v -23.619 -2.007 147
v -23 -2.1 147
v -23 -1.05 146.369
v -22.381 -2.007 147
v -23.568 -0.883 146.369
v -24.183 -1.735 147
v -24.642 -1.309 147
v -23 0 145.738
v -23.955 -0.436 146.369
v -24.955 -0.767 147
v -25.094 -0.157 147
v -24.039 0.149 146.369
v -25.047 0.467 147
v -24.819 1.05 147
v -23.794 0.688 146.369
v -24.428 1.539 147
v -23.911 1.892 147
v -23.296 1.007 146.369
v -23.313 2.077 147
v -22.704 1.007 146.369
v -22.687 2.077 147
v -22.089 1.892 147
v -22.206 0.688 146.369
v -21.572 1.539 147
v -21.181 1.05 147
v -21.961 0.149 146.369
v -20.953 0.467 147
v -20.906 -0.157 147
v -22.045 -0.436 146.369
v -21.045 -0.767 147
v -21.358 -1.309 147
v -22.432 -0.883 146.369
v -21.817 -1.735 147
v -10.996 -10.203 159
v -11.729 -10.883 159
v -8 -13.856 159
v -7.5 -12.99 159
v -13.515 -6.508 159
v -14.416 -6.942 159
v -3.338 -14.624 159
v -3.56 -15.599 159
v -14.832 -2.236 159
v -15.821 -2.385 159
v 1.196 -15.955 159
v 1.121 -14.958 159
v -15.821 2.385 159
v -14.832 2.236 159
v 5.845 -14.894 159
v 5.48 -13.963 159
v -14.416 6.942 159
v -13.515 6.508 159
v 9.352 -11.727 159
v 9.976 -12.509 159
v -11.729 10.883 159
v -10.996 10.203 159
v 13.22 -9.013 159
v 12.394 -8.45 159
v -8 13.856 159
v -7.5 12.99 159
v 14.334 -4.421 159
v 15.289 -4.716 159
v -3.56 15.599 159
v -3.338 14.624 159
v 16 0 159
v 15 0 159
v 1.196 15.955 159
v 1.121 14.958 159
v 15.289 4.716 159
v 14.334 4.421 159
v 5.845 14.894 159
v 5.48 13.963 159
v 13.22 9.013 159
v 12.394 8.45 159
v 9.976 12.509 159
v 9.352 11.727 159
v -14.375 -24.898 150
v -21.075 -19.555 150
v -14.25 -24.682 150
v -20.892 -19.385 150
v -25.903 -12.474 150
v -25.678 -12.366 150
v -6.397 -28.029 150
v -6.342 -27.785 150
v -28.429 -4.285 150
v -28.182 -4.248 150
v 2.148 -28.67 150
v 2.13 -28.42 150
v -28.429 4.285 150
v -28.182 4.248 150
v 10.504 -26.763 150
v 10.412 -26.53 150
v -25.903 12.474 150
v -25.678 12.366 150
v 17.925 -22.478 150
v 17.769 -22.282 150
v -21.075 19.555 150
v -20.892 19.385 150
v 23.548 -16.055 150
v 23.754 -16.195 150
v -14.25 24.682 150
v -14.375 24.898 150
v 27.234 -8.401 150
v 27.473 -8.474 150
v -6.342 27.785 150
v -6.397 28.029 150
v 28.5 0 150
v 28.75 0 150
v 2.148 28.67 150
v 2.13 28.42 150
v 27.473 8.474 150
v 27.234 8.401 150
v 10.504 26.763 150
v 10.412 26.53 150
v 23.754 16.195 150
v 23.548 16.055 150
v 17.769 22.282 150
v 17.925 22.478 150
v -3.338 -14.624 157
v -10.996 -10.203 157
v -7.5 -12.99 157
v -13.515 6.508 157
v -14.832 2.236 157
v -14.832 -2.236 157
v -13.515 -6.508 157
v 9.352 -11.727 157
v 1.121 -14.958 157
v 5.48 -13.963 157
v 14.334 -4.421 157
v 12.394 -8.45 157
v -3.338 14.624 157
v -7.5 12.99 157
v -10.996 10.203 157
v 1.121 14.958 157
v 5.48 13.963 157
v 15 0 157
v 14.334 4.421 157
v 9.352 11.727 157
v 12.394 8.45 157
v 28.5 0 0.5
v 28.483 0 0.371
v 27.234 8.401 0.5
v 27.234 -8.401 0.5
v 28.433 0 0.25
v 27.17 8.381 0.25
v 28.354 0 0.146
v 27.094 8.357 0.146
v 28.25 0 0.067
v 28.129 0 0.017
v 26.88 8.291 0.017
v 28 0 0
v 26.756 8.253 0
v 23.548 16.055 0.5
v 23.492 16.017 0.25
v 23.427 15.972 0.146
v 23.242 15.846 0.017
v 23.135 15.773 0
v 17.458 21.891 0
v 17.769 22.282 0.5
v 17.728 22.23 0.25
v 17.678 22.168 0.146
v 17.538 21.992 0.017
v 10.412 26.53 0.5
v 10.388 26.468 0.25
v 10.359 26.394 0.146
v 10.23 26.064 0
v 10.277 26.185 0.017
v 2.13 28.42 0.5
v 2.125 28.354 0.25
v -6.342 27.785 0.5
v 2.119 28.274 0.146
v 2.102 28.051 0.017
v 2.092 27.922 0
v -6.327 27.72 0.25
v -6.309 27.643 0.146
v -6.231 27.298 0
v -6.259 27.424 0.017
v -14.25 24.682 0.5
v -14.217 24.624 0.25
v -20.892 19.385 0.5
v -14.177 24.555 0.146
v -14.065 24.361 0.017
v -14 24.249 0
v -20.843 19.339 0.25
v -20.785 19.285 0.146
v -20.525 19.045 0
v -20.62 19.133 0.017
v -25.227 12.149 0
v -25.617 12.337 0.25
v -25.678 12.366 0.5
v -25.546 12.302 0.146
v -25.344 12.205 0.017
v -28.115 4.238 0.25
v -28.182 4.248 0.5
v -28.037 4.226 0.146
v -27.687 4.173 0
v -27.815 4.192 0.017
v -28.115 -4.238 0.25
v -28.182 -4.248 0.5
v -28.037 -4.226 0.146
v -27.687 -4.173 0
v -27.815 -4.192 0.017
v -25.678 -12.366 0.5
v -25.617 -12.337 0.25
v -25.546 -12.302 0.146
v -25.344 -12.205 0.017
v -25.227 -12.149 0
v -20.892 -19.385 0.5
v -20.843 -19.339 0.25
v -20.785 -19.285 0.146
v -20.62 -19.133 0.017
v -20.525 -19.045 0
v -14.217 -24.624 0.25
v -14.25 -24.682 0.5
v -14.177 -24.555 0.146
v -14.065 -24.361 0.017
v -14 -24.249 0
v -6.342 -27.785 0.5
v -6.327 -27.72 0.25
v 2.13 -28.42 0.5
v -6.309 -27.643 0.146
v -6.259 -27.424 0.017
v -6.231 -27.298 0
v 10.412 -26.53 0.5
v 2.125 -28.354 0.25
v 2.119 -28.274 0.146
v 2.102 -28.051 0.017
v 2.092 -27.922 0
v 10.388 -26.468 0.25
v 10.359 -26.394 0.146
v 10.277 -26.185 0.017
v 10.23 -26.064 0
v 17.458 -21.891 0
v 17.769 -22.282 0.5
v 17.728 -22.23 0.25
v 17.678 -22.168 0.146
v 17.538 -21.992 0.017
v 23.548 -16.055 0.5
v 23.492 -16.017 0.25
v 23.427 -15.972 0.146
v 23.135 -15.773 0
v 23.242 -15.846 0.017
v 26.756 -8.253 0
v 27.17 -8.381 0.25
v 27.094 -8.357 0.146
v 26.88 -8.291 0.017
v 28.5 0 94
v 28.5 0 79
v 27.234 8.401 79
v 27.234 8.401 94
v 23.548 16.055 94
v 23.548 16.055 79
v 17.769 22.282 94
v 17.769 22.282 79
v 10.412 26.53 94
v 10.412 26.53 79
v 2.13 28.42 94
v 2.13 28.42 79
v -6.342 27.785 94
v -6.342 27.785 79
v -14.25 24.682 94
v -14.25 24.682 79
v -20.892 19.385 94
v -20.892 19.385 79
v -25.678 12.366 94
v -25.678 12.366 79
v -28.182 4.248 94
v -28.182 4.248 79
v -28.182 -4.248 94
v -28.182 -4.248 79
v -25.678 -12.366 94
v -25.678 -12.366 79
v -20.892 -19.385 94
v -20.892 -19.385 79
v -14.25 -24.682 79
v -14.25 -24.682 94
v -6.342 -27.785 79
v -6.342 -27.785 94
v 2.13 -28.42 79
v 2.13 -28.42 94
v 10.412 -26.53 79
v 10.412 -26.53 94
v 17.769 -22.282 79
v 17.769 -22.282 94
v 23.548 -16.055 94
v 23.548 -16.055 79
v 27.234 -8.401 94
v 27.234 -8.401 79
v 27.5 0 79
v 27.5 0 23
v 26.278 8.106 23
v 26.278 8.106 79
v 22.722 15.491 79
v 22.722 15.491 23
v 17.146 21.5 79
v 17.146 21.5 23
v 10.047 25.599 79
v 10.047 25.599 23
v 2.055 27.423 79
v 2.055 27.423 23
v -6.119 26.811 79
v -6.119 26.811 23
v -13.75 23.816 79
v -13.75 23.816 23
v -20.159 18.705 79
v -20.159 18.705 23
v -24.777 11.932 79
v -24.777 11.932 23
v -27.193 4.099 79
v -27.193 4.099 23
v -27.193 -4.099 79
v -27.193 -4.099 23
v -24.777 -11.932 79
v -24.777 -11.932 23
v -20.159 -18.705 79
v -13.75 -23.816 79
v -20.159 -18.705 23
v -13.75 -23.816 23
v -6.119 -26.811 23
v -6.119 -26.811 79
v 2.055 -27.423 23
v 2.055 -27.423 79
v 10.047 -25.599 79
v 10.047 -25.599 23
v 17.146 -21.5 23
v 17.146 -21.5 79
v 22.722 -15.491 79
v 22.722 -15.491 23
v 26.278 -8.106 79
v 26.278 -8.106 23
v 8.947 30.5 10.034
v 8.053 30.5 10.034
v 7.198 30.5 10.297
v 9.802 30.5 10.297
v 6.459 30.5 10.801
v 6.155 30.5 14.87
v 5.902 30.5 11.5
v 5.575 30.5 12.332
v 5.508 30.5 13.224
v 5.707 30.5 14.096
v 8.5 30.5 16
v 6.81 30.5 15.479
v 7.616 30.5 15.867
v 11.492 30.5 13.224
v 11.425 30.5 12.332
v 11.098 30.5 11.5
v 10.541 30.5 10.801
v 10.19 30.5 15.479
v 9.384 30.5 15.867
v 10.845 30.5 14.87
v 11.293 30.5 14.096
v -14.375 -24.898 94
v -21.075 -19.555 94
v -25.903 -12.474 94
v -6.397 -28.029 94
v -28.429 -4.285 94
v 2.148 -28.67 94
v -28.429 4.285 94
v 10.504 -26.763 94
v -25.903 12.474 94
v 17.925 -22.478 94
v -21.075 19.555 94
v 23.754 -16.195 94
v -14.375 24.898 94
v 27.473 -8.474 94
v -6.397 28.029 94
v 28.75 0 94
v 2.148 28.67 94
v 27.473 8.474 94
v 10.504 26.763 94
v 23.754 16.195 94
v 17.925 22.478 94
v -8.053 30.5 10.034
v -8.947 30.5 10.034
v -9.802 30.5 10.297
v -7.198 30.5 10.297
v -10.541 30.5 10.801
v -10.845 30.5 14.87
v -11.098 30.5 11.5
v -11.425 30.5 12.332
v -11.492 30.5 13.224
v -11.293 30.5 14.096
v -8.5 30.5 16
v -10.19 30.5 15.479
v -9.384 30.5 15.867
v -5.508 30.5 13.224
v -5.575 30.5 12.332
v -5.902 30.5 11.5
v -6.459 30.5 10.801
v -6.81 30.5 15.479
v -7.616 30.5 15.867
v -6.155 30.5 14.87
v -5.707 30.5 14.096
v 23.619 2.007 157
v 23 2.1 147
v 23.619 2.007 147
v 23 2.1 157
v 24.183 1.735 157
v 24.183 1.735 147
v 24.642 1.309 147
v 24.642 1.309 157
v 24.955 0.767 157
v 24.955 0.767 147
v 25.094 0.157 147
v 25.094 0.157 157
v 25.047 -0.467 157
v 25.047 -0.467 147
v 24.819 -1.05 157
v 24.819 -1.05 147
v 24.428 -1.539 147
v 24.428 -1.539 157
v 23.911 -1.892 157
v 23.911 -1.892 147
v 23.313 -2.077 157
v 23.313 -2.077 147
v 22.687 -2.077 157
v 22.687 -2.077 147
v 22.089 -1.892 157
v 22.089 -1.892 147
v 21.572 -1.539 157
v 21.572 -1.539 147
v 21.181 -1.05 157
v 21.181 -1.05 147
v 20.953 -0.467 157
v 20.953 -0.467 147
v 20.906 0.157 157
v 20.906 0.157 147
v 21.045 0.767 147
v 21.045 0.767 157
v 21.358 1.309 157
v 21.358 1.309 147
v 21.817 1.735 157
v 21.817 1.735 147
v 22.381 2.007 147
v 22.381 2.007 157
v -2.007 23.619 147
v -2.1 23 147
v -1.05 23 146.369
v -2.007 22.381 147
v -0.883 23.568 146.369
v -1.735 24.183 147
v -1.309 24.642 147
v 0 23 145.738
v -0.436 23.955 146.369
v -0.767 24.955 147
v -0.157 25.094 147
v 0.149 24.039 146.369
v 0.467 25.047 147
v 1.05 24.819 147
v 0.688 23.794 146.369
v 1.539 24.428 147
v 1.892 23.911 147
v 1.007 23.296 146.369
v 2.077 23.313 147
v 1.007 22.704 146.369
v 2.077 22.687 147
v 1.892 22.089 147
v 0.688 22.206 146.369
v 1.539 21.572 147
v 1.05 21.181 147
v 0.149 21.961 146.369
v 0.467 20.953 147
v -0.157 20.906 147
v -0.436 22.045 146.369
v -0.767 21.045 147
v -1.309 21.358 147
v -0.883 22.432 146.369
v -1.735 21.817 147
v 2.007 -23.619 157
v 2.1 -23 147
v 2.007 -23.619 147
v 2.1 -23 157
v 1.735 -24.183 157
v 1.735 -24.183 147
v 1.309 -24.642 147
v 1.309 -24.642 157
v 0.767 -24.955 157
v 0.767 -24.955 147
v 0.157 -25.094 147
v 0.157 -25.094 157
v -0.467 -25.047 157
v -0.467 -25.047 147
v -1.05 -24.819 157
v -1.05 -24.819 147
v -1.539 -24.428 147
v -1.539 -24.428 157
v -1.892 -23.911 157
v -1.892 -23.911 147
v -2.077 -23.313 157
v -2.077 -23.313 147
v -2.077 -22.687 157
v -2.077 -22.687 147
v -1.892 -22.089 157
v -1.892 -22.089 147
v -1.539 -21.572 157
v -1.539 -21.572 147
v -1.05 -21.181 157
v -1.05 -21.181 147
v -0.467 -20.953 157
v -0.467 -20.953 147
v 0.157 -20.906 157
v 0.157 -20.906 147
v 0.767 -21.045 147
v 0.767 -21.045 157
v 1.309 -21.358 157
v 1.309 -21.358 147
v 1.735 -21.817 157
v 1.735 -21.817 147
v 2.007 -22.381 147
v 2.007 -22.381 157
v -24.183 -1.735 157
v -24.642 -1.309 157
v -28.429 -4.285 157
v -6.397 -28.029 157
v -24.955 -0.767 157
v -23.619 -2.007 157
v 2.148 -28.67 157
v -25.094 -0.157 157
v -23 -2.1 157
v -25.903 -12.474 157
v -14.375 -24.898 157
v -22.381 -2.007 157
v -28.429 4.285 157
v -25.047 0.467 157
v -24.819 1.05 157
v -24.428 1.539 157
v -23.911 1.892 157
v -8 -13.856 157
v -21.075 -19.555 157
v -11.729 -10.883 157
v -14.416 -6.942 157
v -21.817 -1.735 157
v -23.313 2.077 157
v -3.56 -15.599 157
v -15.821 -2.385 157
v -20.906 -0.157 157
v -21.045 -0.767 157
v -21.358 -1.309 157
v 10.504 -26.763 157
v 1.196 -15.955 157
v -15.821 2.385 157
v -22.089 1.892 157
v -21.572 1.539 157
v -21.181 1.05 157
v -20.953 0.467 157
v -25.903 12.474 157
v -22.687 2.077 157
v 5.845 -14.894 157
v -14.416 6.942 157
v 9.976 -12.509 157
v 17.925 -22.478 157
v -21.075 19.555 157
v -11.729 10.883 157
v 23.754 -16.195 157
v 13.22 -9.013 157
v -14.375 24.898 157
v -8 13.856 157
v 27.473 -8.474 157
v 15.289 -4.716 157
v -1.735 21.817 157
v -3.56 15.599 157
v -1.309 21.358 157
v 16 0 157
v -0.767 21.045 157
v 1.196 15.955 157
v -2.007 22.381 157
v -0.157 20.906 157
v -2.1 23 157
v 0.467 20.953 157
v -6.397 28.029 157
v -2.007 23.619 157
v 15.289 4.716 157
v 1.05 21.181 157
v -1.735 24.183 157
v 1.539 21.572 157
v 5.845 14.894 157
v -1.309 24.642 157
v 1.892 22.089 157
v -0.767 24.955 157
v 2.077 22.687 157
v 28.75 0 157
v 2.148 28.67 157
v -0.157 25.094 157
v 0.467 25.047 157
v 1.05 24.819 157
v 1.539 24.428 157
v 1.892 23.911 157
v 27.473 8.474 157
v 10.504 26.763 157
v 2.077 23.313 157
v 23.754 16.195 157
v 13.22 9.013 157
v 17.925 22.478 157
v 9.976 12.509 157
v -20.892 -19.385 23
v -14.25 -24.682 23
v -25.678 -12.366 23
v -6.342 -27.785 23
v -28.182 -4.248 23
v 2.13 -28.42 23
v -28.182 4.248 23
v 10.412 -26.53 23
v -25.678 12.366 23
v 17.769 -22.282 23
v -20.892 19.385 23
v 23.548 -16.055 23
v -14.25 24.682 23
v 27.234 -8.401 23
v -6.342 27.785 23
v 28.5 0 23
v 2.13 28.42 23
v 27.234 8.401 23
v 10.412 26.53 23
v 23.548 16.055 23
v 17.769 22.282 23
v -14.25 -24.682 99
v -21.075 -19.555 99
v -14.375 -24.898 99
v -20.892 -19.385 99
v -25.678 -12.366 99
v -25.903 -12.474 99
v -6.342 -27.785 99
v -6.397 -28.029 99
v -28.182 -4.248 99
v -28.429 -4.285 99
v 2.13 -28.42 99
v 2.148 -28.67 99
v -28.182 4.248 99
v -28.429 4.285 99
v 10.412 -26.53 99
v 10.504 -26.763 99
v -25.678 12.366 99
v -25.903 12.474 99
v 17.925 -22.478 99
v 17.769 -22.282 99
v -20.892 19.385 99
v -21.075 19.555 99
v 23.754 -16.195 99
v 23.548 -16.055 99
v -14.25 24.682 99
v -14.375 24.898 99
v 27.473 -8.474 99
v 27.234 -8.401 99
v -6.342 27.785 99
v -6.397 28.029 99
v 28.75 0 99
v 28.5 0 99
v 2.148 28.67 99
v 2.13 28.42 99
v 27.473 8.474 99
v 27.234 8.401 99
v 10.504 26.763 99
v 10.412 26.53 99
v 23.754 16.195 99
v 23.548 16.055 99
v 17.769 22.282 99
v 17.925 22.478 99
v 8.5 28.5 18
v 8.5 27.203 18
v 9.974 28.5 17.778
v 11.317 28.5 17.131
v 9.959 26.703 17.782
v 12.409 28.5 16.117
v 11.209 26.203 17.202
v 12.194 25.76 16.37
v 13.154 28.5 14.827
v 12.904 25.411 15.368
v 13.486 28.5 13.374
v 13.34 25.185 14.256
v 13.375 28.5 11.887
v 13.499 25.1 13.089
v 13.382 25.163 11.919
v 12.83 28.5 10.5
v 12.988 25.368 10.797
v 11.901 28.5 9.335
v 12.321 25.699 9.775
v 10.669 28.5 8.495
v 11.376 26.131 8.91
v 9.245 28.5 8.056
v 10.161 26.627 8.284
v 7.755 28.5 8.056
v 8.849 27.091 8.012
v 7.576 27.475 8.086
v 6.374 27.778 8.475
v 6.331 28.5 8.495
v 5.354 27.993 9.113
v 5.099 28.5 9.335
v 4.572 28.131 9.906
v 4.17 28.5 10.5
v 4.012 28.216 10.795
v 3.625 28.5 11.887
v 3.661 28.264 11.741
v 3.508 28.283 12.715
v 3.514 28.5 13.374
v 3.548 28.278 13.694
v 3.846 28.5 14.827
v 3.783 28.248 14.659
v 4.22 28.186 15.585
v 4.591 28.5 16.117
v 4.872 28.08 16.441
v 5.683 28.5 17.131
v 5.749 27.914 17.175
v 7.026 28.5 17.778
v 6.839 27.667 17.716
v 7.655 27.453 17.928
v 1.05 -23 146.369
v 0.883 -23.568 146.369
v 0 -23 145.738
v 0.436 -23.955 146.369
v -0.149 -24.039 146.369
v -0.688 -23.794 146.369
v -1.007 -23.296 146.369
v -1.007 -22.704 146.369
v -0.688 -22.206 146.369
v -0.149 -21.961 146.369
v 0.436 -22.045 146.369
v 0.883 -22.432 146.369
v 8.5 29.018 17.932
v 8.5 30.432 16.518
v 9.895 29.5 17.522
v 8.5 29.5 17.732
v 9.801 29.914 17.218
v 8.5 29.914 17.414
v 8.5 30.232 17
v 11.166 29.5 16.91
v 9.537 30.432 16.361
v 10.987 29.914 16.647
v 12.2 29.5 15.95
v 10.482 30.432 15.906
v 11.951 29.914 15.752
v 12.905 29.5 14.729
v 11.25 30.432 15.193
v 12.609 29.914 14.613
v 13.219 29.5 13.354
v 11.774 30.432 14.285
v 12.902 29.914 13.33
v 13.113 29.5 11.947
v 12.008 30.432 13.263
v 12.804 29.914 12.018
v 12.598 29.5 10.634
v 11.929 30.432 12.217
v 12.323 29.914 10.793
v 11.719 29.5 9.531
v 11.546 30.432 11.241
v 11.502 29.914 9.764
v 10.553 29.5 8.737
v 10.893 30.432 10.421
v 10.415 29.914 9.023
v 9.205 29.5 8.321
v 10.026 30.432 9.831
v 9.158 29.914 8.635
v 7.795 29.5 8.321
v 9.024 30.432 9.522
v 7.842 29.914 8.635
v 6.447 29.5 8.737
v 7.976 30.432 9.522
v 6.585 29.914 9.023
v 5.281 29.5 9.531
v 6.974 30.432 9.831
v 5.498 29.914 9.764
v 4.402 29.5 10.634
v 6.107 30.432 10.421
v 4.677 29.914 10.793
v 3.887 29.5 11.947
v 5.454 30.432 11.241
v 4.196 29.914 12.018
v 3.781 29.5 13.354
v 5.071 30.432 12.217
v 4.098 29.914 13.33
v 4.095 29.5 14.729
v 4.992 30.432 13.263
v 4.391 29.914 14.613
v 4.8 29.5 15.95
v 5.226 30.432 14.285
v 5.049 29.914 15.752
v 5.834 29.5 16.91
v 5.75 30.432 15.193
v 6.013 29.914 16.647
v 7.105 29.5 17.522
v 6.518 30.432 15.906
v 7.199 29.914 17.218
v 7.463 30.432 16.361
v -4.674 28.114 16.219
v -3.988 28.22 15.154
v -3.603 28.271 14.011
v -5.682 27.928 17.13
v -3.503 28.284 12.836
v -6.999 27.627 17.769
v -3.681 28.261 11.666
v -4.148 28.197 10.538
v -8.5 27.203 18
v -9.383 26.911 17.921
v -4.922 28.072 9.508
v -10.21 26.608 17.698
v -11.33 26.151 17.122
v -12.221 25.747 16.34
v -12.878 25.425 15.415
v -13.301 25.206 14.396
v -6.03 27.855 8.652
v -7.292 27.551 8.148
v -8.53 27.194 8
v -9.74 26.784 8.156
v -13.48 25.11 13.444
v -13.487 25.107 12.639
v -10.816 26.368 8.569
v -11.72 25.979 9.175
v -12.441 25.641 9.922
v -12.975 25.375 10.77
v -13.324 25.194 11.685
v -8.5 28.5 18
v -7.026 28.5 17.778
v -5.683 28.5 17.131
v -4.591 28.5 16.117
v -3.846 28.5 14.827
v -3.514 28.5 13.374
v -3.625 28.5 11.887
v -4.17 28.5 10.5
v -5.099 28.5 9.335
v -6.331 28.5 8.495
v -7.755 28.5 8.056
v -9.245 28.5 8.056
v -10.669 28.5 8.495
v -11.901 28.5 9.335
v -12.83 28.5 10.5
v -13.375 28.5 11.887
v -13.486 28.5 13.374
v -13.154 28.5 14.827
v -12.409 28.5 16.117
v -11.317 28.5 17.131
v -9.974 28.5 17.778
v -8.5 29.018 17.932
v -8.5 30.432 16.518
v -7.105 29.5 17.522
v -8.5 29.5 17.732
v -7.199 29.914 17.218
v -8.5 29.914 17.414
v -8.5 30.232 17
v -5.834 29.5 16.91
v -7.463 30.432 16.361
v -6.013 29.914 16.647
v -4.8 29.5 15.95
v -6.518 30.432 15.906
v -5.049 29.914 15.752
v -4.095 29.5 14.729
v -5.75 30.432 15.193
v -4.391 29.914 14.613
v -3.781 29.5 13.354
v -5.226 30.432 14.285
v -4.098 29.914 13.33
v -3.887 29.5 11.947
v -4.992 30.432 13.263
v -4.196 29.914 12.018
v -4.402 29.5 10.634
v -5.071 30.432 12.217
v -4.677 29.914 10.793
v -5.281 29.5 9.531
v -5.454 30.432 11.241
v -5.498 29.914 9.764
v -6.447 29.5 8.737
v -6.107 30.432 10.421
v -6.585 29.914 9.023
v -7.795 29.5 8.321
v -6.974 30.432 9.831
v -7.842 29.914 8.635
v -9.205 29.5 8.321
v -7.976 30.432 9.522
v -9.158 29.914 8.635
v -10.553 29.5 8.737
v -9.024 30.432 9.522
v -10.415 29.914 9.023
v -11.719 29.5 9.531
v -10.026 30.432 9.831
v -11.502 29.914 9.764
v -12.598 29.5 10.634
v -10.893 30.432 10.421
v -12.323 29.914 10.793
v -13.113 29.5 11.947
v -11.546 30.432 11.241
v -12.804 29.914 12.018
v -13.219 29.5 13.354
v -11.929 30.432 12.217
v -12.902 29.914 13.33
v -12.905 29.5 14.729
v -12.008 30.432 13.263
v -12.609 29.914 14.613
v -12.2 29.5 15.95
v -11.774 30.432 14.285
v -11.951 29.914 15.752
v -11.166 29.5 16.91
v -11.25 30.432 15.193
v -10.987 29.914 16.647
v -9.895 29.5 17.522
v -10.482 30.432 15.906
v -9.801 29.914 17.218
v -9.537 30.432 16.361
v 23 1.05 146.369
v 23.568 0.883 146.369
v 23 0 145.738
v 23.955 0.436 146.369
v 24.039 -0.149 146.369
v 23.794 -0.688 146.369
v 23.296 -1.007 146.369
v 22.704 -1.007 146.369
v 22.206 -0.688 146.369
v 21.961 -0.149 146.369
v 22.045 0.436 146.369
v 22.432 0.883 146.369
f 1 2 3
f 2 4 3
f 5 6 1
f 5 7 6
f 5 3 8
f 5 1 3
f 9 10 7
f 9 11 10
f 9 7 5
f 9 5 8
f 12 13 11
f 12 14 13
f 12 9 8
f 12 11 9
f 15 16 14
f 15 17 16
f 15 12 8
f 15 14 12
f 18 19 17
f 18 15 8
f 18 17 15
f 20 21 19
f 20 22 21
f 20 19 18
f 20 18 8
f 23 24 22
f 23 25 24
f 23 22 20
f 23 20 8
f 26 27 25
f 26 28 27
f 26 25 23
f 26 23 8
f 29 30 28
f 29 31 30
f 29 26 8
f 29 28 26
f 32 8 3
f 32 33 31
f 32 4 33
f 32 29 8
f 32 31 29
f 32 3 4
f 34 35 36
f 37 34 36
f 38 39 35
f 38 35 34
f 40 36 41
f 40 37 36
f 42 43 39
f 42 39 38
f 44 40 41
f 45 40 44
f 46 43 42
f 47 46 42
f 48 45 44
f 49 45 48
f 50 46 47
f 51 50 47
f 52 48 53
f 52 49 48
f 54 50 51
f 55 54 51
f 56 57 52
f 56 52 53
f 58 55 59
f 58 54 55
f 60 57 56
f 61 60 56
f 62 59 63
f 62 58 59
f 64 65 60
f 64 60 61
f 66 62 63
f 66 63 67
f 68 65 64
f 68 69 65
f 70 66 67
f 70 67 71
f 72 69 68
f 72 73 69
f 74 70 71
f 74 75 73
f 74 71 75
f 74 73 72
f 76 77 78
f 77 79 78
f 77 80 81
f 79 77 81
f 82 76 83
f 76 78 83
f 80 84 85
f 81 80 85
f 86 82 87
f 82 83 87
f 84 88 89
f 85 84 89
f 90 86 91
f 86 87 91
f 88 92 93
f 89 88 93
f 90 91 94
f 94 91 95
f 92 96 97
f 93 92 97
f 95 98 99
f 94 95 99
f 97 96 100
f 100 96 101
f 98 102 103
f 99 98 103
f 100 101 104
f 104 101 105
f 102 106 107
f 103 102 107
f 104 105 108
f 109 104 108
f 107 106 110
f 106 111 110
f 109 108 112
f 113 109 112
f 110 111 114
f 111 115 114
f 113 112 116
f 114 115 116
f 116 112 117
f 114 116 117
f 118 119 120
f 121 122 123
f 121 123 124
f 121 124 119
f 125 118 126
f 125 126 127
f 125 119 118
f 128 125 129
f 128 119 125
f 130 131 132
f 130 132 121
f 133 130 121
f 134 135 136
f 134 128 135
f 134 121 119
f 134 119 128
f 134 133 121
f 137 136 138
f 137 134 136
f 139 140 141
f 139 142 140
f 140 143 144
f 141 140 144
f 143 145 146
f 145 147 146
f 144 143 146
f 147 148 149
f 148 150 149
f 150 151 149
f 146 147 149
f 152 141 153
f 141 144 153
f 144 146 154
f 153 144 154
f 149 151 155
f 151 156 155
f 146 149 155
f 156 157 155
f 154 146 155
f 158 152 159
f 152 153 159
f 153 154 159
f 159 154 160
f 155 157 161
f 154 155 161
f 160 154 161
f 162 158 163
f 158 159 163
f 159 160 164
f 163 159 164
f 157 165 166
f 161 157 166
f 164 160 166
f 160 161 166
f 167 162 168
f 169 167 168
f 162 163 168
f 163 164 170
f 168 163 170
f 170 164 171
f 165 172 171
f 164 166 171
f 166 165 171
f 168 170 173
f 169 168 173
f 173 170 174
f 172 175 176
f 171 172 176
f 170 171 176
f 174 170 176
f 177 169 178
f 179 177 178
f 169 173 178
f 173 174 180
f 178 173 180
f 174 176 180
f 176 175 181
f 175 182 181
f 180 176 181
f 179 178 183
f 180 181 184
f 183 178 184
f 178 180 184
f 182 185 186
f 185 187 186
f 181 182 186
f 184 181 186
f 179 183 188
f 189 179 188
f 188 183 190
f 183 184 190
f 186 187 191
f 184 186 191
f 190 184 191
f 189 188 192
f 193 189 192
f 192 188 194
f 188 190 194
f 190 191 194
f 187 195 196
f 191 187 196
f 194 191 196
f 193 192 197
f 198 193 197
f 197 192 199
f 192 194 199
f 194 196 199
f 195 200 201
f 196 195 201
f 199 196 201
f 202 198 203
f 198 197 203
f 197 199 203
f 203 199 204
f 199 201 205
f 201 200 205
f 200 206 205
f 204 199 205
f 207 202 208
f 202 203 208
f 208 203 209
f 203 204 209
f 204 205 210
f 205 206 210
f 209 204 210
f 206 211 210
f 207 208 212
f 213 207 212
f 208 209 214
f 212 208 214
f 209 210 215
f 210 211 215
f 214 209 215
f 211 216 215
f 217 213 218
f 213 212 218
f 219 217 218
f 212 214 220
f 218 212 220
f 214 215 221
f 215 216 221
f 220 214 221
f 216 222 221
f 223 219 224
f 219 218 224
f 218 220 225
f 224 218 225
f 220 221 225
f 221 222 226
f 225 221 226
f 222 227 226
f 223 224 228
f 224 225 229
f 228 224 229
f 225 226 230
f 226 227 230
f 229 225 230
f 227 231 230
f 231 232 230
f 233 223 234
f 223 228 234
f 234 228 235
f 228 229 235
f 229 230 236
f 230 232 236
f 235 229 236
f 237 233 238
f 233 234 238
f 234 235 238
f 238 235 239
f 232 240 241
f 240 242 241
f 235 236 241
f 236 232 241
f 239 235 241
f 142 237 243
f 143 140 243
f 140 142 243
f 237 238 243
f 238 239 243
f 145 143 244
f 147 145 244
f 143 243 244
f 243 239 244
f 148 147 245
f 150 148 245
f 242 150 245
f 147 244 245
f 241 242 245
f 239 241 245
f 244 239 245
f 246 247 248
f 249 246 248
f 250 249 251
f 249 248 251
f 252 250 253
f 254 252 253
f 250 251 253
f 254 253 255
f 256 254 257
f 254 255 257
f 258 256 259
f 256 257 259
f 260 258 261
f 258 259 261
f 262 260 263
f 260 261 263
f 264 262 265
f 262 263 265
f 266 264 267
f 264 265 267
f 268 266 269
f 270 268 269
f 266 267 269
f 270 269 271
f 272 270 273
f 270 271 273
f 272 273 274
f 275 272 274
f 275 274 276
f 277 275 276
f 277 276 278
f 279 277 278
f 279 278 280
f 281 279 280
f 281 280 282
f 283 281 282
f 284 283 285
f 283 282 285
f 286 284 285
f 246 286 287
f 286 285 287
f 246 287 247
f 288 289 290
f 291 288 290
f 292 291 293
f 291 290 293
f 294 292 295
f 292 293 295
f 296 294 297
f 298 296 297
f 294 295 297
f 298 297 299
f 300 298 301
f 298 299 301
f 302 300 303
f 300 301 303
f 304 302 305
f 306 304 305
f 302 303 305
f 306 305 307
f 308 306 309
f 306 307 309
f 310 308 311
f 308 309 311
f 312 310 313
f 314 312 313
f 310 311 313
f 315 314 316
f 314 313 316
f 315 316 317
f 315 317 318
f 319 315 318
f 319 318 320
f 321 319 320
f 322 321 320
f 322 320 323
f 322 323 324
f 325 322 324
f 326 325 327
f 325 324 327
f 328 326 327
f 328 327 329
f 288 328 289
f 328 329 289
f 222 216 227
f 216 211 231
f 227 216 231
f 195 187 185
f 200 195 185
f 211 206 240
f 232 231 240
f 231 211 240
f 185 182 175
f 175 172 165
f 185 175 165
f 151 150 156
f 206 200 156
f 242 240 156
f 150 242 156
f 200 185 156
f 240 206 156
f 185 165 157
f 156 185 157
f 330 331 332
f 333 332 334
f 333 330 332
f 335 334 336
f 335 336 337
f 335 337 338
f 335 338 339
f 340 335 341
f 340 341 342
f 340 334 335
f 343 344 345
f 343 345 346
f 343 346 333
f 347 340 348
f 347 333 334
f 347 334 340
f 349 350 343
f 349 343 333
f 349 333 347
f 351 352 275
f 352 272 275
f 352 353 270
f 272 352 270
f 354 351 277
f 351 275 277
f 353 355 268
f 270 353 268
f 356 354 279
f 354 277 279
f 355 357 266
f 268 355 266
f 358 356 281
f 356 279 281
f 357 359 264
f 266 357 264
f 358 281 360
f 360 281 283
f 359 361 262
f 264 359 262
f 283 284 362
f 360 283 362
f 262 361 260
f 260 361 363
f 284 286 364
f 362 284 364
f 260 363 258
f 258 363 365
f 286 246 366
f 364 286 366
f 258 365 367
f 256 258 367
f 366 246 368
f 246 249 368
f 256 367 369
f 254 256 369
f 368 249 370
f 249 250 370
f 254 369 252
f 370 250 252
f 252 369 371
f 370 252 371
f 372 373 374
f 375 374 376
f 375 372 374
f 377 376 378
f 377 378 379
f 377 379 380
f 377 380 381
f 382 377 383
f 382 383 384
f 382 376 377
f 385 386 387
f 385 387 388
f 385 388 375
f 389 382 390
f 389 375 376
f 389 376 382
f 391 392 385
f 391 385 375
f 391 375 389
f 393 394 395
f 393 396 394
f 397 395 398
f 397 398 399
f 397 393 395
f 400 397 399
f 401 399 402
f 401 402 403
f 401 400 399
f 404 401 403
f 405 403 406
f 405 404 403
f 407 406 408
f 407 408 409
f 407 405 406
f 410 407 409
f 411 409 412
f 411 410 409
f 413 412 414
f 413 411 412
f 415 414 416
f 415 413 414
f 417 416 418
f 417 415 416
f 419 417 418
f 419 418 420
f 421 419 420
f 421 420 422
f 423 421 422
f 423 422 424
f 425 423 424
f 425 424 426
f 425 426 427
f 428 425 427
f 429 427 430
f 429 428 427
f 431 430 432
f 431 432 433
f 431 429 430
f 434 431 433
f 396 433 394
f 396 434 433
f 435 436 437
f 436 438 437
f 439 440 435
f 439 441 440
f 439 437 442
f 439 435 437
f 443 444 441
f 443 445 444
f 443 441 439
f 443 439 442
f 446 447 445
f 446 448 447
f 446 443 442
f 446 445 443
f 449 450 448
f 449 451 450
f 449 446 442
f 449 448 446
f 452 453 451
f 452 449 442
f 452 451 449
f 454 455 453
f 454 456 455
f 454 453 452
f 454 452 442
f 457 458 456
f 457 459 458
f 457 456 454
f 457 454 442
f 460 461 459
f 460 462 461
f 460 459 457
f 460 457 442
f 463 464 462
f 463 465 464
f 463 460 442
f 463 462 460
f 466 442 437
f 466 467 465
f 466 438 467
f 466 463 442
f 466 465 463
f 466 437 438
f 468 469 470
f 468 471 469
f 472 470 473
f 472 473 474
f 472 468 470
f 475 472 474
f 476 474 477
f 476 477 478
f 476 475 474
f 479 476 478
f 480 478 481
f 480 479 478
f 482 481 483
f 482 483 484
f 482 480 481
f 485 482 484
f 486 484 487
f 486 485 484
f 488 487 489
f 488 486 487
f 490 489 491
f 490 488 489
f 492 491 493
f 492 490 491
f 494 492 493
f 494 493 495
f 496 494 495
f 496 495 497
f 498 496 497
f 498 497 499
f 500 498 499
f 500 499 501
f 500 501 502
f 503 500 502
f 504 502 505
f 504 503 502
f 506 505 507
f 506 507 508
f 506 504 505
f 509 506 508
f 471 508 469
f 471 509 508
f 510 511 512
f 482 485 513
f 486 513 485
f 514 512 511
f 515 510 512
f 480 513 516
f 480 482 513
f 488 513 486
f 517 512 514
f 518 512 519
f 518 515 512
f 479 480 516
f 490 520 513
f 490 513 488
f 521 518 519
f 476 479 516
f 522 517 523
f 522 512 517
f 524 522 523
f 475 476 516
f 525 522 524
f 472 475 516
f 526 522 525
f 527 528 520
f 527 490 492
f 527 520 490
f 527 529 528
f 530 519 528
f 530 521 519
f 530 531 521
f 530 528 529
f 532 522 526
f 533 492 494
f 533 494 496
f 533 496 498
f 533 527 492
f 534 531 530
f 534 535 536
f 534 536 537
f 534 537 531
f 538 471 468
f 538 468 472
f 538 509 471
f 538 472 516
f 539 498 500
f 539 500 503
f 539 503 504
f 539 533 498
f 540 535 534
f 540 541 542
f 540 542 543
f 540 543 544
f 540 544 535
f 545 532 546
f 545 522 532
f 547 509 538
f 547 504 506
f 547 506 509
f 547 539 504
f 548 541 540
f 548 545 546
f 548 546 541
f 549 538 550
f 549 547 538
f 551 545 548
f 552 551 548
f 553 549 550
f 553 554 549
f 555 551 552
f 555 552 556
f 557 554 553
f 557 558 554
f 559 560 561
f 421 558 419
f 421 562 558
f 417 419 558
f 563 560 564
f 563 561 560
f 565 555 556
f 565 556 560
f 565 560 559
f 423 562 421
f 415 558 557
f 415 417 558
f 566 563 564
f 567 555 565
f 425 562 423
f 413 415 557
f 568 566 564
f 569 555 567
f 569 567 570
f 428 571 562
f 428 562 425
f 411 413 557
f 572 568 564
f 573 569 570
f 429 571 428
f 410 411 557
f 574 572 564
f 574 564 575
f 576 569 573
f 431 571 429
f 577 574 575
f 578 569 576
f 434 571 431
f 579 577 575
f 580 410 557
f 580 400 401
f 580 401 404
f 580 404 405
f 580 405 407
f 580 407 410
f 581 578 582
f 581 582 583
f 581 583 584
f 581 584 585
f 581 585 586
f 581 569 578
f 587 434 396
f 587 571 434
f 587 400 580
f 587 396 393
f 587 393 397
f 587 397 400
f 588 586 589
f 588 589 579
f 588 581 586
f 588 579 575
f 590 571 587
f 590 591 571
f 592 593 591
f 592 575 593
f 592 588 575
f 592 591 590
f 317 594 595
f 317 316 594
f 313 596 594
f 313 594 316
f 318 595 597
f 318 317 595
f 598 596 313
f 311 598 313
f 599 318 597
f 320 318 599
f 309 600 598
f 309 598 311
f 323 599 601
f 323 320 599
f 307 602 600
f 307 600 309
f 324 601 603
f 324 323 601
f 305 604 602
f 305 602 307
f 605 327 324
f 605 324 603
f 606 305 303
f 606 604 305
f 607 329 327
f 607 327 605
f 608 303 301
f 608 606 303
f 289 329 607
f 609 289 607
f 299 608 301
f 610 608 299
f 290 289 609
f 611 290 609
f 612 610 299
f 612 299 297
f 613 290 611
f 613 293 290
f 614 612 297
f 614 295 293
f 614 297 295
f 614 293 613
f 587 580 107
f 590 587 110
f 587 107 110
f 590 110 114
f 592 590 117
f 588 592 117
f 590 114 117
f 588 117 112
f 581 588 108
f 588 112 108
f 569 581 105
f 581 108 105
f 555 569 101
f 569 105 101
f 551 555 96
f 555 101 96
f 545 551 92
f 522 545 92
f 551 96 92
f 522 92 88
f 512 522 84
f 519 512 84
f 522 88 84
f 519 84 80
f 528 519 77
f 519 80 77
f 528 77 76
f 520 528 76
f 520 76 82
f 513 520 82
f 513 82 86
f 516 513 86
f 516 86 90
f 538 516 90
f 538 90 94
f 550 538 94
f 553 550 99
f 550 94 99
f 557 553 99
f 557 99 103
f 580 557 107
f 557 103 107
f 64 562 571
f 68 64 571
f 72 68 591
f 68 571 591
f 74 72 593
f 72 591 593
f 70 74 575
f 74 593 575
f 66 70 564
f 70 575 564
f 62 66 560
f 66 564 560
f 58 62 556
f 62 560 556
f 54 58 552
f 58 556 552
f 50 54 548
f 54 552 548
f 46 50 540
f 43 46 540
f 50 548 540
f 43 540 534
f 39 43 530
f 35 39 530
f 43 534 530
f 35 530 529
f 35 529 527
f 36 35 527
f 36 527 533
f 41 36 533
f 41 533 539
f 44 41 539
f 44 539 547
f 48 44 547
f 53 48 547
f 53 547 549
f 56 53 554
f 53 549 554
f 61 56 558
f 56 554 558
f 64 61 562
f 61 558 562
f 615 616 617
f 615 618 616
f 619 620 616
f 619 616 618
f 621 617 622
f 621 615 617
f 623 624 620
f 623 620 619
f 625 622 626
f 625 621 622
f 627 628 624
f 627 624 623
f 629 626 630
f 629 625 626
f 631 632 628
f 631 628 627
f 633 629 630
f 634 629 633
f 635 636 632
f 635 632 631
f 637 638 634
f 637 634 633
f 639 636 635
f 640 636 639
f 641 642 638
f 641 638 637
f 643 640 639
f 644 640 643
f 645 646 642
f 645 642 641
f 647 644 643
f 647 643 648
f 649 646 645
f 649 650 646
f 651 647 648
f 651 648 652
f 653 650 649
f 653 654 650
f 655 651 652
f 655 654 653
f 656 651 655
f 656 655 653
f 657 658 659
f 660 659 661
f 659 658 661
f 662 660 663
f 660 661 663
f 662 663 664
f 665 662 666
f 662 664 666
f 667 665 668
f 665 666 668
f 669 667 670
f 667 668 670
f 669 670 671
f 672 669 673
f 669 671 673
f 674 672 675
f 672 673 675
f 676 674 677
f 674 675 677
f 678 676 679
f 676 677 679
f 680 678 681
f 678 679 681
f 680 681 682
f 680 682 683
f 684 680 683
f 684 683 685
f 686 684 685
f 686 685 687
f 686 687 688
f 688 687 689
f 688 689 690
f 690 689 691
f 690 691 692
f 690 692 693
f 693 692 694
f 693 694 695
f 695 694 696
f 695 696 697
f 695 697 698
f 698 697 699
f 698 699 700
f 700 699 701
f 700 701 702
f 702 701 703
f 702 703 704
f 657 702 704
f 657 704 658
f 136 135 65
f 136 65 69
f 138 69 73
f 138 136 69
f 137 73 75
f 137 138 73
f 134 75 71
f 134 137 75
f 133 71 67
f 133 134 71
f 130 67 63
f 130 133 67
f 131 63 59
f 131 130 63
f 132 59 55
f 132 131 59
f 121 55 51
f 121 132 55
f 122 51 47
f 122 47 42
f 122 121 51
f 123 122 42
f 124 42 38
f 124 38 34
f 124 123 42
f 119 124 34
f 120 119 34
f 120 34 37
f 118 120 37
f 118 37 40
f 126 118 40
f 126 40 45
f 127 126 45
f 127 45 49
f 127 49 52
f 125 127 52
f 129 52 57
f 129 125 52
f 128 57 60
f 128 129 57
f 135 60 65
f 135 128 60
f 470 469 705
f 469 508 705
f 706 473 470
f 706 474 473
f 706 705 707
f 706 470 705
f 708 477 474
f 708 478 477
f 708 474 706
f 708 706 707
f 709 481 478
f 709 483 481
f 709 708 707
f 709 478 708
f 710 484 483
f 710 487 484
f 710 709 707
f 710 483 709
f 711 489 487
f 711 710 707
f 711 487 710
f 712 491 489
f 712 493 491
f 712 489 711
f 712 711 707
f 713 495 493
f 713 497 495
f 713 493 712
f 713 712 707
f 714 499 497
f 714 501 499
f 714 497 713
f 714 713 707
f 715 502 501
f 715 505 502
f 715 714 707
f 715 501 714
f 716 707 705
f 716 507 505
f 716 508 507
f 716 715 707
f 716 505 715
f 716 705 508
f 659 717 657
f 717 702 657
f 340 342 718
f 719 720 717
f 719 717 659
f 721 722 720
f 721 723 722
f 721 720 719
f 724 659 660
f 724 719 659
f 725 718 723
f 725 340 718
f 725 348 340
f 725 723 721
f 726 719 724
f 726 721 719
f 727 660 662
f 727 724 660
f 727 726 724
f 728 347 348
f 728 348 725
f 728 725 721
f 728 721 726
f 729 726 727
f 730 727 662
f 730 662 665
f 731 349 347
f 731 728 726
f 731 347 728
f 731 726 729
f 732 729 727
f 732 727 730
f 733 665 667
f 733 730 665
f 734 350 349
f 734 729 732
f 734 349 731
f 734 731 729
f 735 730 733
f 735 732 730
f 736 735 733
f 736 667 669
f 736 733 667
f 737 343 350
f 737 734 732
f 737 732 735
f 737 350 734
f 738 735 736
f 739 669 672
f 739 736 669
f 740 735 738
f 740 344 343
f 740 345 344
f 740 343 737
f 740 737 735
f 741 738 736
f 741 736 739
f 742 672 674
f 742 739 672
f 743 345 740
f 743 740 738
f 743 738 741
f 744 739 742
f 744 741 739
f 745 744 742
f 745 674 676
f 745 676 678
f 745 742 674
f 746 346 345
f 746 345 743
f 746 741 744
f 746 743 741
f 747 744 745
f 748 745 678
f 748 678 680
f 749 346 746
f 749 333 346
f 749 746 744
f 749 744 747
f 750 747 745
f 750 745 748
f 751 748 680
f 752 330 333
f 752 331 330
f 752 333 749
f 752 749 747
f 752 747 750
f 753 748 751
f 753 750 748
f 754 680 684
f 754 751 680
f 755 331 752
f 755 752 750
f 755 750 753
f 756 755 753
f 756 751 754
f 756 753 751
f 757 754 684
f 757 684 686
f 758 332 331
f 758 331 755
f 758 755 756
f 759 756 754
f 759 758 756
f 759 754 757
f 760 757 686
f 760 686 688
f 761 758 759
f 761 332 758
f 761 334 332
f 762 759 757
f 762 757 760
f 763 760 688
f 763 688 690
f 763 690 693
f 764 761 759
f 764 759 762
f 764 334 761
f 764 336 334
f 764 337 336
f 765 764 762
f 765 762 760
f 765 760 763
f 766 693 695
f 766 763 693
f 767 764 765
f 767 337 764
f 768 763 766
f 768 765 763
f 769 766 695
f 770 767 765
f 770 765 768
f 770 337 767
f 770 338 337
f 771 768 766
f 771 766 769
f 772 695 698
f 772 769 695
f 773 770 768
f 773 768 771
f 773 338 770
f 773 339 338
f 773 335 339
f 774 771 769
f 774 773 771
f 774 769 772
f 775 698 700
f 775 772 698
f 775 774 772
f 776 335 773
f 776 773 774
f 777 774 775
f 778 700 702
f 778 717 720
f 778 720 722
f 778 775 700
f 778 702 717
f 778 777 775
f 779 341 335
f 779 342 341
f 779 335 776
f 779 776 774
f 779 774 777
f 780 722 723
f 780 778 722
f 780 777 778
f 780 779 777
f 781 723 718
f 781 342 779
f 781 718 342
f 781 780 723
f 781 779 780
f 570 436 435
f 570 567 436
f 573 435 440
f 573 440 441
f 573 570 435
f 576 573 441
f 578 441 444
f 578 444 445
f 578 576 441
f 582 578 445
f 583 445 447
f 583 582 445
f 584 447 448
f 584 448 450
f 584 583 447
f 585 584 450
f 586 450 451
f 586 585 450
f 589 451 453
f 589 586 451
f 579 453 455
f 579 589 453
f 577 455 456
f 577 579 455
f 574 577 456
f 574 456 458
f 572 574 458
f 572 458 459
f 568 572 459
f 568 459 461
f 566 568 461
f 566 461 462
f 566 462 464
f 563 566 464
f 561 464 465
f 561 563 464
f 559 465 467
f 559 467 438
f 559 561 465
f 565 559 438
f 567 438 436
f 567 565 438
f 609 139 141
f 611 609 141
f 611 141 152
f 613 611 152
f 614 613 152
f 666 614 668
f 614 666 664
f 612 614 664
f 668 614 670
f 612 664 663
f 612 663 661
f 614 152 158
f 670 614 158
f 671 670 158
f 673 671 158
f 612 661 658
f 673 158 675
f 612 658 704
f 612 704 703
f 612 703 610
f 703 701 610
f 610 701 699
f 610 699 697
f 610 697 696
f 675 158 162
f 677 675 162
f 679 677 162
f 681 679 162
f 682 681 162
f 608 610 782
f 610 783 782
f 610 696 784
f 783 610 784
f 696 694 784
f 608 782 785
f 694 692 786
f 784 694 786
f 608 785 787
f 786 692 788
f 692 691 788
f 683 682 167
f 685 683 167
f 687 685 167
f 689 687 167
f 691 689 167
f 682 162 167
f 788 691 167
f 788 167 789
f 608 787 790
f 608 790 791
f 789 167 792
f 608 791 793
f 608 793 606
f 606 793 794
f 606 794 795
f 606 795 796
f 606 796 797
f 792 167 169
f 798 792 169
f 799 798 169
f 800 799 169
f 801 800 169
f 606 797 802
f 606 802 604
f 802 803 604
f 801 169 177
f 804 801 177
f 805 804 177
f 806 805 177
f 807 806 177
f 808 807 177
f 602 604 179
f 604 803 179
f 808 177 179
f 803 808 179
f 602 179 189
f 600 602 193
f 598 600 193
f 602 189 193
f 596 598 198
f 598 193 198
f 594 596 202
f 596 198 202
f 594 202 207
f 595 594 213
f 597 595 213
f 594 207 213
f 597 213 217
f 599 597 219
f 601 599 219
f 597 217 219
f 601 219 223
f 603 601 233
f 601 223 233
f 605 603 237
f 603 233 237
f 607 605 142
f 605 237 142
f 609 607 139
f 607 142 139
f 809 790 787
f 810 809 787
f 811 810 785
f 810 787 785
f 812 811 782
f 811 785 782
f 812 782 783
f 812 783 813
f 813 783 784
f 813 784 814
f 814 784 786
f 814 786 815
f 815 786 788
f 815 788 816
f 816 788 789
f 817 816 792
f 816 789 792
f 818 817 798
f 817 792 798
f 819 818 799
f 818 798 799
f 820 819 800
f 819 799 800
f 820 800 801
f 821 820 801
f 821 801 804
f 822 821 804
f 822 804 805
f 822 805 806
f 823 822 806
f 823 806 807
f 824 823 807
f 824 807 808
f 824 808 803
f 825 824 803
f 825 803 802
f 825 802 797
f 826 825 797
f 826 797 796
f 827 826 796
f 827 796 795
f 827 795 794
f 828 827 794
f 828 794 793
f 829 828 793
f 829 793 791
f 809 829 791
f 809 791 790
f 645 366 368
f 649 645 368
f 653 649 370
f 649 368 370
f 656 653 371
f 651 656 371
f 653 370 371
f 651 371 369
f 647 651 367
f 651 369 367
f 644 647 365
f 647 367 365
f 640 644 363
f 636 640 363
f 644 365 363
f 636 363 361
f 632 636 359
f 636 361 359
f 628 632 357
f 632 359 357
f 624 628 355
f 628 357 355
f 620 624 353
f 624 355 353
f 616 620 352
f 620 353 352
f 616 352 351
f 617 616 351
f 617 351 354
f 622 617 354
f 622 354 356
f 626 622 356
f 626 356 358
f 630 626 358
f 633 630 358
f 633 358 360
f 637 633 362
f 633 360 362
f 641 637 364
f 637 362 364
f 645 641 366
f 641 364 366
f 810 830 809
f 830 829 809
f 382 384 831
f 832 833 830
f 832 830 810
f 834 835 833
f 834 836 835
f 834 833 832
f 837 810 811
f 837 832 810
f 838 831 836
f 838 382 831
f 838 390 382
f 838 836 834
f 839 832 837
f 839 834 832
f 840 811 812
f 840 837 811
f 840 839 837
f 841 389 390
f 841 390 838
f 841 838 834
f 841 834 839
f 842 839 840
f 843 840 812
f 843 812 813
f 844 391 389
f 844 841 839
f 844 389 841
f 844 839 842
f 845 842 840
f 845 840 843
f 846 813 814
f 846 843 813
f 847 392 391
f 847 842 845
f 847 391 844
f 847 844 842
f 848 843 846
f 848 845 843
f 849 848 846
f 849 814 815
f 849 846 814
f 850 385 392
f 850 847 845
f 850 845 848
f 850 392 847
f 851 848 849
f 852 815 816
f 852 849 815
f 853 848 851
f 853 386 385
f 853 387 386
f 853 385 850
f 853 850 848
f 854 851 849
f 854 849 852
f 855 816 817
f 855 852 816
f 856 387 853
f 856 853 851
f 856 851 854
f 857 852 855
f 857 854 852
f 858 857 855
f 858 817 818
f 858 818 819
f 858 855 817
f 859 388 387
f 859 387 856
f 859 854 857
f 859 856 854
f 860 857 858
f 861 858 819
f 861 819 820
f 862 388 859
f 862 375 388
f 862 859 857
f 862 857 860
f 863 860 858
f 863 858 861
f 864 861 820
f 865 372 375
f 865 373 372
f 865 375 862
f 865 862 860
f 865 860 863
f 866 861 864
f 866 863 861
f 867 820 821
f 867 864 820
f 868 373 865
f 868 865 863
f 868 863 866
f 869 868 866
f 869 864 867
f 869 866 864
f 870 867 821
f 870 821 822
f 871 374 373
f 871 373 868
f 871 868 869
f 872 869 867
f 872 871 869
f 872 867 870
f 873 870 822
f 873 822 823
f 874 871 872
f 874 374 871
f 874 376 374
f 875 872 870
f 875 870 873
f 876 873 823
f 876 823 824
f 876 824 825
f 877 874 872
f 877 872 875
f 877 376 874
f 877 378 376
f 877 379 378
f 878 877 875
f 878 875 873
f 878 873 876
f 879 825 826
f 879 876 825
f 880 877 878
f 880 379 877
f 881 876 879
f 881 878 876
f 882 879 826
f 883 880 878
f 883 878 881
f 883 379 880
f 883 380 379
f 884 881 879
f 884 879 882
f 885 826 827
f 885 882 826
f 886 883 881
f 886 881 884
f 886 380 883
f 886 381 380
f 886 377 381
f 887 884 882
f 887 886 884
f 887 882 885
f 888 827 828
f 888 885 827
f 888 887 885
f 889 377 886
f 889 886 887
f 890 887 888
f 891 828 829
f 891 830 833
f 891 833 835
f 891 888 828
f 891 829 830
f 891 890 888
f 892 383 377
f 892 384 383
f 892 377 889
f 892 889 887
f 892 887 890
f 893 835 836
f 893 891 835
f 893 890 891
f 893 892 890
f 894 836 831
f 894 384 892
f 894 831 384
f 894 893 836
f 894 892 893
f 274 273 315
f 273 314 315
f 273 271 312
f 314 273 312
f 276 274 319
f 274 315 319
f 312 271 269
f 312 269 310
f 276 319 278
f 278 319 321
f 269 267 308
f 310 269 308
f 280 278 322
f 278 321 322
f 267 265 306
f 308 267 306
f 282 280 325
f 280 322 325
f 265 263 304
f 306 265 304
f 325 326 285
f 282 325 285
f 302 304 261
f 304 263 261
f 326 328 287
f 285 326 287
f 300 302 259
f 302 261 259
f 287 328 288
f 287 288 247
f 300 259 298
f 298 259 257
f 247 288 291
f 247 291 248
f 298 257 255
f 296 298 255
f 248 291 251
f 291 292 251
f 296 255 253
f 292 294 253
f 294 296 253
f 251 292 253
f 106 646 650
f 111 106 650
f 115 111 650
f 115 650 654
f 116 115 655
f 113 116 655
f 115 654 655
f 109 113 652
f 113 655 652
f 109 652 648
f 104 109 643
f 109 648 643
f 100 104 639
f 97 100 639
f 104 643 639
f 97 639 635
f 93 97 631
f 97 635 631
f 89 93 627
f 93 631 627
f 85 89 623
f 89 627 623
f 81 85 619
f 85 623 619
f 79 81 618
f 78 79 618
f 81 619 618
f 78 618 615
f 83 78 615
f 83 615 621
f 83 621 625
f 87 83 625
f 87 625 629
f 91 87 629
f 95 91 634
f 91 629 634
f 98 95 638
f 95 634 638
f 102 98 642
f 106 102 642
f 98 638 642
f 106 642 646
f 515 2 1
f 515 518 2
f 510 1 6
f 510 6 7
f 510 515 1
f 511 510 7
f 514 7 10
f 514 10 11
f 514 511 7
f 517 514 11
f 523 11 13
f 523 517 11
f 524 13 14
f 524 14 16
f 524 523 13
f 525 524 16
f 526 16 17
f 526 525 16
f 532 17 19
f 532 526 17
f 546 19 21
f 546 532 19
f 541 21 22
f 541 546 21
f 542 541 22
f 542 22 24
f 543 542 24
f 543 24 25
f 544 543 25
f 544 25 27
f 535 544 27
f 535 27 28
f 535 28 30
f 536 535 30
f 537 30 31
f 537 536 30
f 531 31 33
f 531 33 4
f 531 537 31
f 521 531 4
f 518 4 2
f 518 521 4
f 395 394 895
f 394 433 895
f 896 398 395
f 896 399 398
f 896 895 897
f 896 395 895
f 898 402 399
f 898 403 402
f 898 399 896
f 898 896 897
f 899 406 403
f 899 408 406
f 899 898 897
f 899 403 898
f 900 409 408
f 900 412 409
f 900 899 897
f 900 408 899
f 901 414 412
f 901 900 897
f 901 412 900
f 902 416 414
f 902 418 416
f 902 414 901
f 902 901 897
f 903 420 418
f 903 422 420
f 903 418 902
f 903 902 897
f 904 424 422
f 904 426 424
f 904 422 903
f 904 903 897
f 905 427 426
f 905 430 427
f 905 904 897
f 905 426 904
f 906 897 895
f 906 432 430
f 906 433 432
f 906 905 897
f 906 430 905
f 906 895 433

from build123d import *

# Parameters (mm, degrees)
ESQUISSE1_R                  = 28.5
BOSS_EXTRU_1_DEPTH           = 23
ESQUISSE3_R                  = 27.5
BOSS_EXTRU_2_DEPTH           = 56
ESQUISSE4_R                  = 28.5
BOSS_EXTRU_3_DEPTH           = 15
ESQUISSE5_R                  = 28.75
BOSS_EXTRU_4_DEPTH           = 5
ESQUISSE6_R                  = 28.5
BOSS_EXTRU_5_DEPTH           = 51
ESQUISSE7_R                  = 28.75
BOSS_EXTRU_6_DEPTH           = 7
CONG_1_R                     = 0.5
ESQUISSE8_R                  = 16
ESQUISSE8_R_2                = 15
BOSS_EXTRU_7_DEPTH           = 2
R_P_TITION_CIRCULAIRE1_COUNT = 4
BOSS_EXTRU_8_DEPTH           = 2
BOSS_EXTRU_8_DEPTH_BACK      = 10
ESQUISSE12_R                 = 5
CONG_2_R                     = 2


with BuildPart() as part:
    # Esquisse1 → Boss.-Extru.1 (new body)
    with BuildSketch(Plane.XY):
        Circle(ESQUISSE1_R)
    extrude(amount=BOSS_EXTRU_1_DEPTH)

    # Esquisse3 → Boss.-Extru.2 (add)
    with BuildSketch(Plane.XY.offset(23)):
        Circle(ESQUISSE3_R)
    extrude(amount=BOSS_EXTRU_2_DEPTH)

    # Esquisse4 → Boss.-Extru.3 (add)
    with BuildSketch(Plane.XY.offset(79)):
        Circle(ESQUISSE4_R)
    extrude(amount=BOSS_EXTRU_3_DEPTH)

    # Esquisse5 → Boss.-Extru.4 (add)
    with BuildSketch(Plane.XY.offset(94)):
        Circle(ESQUISSE5_R)
    extrude(amount=BOSS_EXTRU_4_DEPTH)

    # Esquisse6 → Boss.-Extru.5 (add)
    with BuildSketch(Plane.XY.offset(99)):
        Circle(ESQUISSE6_R)
    extrude(amount=BOSS_EXTRU_5_DEPTH)

    # Esquisse7 → Boss.-Extru.6 (add)
    with BuildSketch(Plane.XY.offset(150)):
        Circle(ESQUISSE7_R)
    extrude(amount=BOSS_EXTRU_6_DEPTH)

    # Congé1
    cong_1_edges = [part.edges().sort_by_distance(p)[0] for p in [
        (-28.5, 0, 0),
    ]]
    fillet(cong_1_edges, radius=CONG_1_R)

    # Esquisse8 → Boss.-Extru.7 (add)
    with BuildSketch(Plane.XY.offset(157)):
        Circle(ESQUISSE8_R)
        Circle(ESQUISSE8_R_2, mode=Mode.SUBTRACT)
    extrude(amount=BOSS_EXTRU_7_DEPTH)

    # Esquisse10 → Trou pour taraudage pour trou taraudé M51 (revolve, cut)
    with BuildSketch(Plane(origin=(-23, 0, 157), x_dir=(0, -1, 0), z_dir=(1, 0, 0))):
        Polygon((0, 0), (0, 11.2618073), (2.1, 10), (2.1, 0), align=None)
    trou_pour_taraudage_pour_trou_taraud_m5 = revolve(axis=Axis((-23, 0, 163.35), (0, 0, -1)), mode=Mode.SUBTRACT)

    # Répétition circulaire1: Trou pour taraudage pour trou taraudé M51 ×4 about axis
    r_p_tition_circulaire1_axis = Axis((0, 0, 157), (0, 0, -1))
    for i in range(1, R_P_TITION_CIRCULAIRE1_COUNT):
        add(trou_pour_taraudage_pour_trou_taraud_m5.rotate(r_p_tition_circulaire1_axis, i * 360 / R_P_TITION_CIRCULAIRE1_COUNT), mode=Mode.SUBTRACT)

    # Esquisse12 → Boss.-Extru.8 (add, two sides: drawn at the far end of the back side and taken through both)
    with BuildSketch(Plane(origin=(0, 28.5, 0), x_dir=(1, 0, 0), z_dir=(0, 1, 0)).offset(-BOSS_EXTRU_8_DEPTH_BACK)):
        with Locations((-8.5, -13)):
            Circle(ESQUISSE12_R)
        with Locations((8.5, -13)):
            Circle(ESQUISSE12_R)
    extrude(amount=BOSS_EXTRU_8_DEPTH + BOSS_EXTRU_8_DEPTH_BACK)

    # Congé2
    cong_2_edges = [part.edges().sort_by_distance(p)[0] for p in [
        (3.5, 30.5, 13),
        (-13.5, 30.5, 13),
    ]]
    fillet(cong_2_edges, radius=CONG_2_R)


solid = part.part
